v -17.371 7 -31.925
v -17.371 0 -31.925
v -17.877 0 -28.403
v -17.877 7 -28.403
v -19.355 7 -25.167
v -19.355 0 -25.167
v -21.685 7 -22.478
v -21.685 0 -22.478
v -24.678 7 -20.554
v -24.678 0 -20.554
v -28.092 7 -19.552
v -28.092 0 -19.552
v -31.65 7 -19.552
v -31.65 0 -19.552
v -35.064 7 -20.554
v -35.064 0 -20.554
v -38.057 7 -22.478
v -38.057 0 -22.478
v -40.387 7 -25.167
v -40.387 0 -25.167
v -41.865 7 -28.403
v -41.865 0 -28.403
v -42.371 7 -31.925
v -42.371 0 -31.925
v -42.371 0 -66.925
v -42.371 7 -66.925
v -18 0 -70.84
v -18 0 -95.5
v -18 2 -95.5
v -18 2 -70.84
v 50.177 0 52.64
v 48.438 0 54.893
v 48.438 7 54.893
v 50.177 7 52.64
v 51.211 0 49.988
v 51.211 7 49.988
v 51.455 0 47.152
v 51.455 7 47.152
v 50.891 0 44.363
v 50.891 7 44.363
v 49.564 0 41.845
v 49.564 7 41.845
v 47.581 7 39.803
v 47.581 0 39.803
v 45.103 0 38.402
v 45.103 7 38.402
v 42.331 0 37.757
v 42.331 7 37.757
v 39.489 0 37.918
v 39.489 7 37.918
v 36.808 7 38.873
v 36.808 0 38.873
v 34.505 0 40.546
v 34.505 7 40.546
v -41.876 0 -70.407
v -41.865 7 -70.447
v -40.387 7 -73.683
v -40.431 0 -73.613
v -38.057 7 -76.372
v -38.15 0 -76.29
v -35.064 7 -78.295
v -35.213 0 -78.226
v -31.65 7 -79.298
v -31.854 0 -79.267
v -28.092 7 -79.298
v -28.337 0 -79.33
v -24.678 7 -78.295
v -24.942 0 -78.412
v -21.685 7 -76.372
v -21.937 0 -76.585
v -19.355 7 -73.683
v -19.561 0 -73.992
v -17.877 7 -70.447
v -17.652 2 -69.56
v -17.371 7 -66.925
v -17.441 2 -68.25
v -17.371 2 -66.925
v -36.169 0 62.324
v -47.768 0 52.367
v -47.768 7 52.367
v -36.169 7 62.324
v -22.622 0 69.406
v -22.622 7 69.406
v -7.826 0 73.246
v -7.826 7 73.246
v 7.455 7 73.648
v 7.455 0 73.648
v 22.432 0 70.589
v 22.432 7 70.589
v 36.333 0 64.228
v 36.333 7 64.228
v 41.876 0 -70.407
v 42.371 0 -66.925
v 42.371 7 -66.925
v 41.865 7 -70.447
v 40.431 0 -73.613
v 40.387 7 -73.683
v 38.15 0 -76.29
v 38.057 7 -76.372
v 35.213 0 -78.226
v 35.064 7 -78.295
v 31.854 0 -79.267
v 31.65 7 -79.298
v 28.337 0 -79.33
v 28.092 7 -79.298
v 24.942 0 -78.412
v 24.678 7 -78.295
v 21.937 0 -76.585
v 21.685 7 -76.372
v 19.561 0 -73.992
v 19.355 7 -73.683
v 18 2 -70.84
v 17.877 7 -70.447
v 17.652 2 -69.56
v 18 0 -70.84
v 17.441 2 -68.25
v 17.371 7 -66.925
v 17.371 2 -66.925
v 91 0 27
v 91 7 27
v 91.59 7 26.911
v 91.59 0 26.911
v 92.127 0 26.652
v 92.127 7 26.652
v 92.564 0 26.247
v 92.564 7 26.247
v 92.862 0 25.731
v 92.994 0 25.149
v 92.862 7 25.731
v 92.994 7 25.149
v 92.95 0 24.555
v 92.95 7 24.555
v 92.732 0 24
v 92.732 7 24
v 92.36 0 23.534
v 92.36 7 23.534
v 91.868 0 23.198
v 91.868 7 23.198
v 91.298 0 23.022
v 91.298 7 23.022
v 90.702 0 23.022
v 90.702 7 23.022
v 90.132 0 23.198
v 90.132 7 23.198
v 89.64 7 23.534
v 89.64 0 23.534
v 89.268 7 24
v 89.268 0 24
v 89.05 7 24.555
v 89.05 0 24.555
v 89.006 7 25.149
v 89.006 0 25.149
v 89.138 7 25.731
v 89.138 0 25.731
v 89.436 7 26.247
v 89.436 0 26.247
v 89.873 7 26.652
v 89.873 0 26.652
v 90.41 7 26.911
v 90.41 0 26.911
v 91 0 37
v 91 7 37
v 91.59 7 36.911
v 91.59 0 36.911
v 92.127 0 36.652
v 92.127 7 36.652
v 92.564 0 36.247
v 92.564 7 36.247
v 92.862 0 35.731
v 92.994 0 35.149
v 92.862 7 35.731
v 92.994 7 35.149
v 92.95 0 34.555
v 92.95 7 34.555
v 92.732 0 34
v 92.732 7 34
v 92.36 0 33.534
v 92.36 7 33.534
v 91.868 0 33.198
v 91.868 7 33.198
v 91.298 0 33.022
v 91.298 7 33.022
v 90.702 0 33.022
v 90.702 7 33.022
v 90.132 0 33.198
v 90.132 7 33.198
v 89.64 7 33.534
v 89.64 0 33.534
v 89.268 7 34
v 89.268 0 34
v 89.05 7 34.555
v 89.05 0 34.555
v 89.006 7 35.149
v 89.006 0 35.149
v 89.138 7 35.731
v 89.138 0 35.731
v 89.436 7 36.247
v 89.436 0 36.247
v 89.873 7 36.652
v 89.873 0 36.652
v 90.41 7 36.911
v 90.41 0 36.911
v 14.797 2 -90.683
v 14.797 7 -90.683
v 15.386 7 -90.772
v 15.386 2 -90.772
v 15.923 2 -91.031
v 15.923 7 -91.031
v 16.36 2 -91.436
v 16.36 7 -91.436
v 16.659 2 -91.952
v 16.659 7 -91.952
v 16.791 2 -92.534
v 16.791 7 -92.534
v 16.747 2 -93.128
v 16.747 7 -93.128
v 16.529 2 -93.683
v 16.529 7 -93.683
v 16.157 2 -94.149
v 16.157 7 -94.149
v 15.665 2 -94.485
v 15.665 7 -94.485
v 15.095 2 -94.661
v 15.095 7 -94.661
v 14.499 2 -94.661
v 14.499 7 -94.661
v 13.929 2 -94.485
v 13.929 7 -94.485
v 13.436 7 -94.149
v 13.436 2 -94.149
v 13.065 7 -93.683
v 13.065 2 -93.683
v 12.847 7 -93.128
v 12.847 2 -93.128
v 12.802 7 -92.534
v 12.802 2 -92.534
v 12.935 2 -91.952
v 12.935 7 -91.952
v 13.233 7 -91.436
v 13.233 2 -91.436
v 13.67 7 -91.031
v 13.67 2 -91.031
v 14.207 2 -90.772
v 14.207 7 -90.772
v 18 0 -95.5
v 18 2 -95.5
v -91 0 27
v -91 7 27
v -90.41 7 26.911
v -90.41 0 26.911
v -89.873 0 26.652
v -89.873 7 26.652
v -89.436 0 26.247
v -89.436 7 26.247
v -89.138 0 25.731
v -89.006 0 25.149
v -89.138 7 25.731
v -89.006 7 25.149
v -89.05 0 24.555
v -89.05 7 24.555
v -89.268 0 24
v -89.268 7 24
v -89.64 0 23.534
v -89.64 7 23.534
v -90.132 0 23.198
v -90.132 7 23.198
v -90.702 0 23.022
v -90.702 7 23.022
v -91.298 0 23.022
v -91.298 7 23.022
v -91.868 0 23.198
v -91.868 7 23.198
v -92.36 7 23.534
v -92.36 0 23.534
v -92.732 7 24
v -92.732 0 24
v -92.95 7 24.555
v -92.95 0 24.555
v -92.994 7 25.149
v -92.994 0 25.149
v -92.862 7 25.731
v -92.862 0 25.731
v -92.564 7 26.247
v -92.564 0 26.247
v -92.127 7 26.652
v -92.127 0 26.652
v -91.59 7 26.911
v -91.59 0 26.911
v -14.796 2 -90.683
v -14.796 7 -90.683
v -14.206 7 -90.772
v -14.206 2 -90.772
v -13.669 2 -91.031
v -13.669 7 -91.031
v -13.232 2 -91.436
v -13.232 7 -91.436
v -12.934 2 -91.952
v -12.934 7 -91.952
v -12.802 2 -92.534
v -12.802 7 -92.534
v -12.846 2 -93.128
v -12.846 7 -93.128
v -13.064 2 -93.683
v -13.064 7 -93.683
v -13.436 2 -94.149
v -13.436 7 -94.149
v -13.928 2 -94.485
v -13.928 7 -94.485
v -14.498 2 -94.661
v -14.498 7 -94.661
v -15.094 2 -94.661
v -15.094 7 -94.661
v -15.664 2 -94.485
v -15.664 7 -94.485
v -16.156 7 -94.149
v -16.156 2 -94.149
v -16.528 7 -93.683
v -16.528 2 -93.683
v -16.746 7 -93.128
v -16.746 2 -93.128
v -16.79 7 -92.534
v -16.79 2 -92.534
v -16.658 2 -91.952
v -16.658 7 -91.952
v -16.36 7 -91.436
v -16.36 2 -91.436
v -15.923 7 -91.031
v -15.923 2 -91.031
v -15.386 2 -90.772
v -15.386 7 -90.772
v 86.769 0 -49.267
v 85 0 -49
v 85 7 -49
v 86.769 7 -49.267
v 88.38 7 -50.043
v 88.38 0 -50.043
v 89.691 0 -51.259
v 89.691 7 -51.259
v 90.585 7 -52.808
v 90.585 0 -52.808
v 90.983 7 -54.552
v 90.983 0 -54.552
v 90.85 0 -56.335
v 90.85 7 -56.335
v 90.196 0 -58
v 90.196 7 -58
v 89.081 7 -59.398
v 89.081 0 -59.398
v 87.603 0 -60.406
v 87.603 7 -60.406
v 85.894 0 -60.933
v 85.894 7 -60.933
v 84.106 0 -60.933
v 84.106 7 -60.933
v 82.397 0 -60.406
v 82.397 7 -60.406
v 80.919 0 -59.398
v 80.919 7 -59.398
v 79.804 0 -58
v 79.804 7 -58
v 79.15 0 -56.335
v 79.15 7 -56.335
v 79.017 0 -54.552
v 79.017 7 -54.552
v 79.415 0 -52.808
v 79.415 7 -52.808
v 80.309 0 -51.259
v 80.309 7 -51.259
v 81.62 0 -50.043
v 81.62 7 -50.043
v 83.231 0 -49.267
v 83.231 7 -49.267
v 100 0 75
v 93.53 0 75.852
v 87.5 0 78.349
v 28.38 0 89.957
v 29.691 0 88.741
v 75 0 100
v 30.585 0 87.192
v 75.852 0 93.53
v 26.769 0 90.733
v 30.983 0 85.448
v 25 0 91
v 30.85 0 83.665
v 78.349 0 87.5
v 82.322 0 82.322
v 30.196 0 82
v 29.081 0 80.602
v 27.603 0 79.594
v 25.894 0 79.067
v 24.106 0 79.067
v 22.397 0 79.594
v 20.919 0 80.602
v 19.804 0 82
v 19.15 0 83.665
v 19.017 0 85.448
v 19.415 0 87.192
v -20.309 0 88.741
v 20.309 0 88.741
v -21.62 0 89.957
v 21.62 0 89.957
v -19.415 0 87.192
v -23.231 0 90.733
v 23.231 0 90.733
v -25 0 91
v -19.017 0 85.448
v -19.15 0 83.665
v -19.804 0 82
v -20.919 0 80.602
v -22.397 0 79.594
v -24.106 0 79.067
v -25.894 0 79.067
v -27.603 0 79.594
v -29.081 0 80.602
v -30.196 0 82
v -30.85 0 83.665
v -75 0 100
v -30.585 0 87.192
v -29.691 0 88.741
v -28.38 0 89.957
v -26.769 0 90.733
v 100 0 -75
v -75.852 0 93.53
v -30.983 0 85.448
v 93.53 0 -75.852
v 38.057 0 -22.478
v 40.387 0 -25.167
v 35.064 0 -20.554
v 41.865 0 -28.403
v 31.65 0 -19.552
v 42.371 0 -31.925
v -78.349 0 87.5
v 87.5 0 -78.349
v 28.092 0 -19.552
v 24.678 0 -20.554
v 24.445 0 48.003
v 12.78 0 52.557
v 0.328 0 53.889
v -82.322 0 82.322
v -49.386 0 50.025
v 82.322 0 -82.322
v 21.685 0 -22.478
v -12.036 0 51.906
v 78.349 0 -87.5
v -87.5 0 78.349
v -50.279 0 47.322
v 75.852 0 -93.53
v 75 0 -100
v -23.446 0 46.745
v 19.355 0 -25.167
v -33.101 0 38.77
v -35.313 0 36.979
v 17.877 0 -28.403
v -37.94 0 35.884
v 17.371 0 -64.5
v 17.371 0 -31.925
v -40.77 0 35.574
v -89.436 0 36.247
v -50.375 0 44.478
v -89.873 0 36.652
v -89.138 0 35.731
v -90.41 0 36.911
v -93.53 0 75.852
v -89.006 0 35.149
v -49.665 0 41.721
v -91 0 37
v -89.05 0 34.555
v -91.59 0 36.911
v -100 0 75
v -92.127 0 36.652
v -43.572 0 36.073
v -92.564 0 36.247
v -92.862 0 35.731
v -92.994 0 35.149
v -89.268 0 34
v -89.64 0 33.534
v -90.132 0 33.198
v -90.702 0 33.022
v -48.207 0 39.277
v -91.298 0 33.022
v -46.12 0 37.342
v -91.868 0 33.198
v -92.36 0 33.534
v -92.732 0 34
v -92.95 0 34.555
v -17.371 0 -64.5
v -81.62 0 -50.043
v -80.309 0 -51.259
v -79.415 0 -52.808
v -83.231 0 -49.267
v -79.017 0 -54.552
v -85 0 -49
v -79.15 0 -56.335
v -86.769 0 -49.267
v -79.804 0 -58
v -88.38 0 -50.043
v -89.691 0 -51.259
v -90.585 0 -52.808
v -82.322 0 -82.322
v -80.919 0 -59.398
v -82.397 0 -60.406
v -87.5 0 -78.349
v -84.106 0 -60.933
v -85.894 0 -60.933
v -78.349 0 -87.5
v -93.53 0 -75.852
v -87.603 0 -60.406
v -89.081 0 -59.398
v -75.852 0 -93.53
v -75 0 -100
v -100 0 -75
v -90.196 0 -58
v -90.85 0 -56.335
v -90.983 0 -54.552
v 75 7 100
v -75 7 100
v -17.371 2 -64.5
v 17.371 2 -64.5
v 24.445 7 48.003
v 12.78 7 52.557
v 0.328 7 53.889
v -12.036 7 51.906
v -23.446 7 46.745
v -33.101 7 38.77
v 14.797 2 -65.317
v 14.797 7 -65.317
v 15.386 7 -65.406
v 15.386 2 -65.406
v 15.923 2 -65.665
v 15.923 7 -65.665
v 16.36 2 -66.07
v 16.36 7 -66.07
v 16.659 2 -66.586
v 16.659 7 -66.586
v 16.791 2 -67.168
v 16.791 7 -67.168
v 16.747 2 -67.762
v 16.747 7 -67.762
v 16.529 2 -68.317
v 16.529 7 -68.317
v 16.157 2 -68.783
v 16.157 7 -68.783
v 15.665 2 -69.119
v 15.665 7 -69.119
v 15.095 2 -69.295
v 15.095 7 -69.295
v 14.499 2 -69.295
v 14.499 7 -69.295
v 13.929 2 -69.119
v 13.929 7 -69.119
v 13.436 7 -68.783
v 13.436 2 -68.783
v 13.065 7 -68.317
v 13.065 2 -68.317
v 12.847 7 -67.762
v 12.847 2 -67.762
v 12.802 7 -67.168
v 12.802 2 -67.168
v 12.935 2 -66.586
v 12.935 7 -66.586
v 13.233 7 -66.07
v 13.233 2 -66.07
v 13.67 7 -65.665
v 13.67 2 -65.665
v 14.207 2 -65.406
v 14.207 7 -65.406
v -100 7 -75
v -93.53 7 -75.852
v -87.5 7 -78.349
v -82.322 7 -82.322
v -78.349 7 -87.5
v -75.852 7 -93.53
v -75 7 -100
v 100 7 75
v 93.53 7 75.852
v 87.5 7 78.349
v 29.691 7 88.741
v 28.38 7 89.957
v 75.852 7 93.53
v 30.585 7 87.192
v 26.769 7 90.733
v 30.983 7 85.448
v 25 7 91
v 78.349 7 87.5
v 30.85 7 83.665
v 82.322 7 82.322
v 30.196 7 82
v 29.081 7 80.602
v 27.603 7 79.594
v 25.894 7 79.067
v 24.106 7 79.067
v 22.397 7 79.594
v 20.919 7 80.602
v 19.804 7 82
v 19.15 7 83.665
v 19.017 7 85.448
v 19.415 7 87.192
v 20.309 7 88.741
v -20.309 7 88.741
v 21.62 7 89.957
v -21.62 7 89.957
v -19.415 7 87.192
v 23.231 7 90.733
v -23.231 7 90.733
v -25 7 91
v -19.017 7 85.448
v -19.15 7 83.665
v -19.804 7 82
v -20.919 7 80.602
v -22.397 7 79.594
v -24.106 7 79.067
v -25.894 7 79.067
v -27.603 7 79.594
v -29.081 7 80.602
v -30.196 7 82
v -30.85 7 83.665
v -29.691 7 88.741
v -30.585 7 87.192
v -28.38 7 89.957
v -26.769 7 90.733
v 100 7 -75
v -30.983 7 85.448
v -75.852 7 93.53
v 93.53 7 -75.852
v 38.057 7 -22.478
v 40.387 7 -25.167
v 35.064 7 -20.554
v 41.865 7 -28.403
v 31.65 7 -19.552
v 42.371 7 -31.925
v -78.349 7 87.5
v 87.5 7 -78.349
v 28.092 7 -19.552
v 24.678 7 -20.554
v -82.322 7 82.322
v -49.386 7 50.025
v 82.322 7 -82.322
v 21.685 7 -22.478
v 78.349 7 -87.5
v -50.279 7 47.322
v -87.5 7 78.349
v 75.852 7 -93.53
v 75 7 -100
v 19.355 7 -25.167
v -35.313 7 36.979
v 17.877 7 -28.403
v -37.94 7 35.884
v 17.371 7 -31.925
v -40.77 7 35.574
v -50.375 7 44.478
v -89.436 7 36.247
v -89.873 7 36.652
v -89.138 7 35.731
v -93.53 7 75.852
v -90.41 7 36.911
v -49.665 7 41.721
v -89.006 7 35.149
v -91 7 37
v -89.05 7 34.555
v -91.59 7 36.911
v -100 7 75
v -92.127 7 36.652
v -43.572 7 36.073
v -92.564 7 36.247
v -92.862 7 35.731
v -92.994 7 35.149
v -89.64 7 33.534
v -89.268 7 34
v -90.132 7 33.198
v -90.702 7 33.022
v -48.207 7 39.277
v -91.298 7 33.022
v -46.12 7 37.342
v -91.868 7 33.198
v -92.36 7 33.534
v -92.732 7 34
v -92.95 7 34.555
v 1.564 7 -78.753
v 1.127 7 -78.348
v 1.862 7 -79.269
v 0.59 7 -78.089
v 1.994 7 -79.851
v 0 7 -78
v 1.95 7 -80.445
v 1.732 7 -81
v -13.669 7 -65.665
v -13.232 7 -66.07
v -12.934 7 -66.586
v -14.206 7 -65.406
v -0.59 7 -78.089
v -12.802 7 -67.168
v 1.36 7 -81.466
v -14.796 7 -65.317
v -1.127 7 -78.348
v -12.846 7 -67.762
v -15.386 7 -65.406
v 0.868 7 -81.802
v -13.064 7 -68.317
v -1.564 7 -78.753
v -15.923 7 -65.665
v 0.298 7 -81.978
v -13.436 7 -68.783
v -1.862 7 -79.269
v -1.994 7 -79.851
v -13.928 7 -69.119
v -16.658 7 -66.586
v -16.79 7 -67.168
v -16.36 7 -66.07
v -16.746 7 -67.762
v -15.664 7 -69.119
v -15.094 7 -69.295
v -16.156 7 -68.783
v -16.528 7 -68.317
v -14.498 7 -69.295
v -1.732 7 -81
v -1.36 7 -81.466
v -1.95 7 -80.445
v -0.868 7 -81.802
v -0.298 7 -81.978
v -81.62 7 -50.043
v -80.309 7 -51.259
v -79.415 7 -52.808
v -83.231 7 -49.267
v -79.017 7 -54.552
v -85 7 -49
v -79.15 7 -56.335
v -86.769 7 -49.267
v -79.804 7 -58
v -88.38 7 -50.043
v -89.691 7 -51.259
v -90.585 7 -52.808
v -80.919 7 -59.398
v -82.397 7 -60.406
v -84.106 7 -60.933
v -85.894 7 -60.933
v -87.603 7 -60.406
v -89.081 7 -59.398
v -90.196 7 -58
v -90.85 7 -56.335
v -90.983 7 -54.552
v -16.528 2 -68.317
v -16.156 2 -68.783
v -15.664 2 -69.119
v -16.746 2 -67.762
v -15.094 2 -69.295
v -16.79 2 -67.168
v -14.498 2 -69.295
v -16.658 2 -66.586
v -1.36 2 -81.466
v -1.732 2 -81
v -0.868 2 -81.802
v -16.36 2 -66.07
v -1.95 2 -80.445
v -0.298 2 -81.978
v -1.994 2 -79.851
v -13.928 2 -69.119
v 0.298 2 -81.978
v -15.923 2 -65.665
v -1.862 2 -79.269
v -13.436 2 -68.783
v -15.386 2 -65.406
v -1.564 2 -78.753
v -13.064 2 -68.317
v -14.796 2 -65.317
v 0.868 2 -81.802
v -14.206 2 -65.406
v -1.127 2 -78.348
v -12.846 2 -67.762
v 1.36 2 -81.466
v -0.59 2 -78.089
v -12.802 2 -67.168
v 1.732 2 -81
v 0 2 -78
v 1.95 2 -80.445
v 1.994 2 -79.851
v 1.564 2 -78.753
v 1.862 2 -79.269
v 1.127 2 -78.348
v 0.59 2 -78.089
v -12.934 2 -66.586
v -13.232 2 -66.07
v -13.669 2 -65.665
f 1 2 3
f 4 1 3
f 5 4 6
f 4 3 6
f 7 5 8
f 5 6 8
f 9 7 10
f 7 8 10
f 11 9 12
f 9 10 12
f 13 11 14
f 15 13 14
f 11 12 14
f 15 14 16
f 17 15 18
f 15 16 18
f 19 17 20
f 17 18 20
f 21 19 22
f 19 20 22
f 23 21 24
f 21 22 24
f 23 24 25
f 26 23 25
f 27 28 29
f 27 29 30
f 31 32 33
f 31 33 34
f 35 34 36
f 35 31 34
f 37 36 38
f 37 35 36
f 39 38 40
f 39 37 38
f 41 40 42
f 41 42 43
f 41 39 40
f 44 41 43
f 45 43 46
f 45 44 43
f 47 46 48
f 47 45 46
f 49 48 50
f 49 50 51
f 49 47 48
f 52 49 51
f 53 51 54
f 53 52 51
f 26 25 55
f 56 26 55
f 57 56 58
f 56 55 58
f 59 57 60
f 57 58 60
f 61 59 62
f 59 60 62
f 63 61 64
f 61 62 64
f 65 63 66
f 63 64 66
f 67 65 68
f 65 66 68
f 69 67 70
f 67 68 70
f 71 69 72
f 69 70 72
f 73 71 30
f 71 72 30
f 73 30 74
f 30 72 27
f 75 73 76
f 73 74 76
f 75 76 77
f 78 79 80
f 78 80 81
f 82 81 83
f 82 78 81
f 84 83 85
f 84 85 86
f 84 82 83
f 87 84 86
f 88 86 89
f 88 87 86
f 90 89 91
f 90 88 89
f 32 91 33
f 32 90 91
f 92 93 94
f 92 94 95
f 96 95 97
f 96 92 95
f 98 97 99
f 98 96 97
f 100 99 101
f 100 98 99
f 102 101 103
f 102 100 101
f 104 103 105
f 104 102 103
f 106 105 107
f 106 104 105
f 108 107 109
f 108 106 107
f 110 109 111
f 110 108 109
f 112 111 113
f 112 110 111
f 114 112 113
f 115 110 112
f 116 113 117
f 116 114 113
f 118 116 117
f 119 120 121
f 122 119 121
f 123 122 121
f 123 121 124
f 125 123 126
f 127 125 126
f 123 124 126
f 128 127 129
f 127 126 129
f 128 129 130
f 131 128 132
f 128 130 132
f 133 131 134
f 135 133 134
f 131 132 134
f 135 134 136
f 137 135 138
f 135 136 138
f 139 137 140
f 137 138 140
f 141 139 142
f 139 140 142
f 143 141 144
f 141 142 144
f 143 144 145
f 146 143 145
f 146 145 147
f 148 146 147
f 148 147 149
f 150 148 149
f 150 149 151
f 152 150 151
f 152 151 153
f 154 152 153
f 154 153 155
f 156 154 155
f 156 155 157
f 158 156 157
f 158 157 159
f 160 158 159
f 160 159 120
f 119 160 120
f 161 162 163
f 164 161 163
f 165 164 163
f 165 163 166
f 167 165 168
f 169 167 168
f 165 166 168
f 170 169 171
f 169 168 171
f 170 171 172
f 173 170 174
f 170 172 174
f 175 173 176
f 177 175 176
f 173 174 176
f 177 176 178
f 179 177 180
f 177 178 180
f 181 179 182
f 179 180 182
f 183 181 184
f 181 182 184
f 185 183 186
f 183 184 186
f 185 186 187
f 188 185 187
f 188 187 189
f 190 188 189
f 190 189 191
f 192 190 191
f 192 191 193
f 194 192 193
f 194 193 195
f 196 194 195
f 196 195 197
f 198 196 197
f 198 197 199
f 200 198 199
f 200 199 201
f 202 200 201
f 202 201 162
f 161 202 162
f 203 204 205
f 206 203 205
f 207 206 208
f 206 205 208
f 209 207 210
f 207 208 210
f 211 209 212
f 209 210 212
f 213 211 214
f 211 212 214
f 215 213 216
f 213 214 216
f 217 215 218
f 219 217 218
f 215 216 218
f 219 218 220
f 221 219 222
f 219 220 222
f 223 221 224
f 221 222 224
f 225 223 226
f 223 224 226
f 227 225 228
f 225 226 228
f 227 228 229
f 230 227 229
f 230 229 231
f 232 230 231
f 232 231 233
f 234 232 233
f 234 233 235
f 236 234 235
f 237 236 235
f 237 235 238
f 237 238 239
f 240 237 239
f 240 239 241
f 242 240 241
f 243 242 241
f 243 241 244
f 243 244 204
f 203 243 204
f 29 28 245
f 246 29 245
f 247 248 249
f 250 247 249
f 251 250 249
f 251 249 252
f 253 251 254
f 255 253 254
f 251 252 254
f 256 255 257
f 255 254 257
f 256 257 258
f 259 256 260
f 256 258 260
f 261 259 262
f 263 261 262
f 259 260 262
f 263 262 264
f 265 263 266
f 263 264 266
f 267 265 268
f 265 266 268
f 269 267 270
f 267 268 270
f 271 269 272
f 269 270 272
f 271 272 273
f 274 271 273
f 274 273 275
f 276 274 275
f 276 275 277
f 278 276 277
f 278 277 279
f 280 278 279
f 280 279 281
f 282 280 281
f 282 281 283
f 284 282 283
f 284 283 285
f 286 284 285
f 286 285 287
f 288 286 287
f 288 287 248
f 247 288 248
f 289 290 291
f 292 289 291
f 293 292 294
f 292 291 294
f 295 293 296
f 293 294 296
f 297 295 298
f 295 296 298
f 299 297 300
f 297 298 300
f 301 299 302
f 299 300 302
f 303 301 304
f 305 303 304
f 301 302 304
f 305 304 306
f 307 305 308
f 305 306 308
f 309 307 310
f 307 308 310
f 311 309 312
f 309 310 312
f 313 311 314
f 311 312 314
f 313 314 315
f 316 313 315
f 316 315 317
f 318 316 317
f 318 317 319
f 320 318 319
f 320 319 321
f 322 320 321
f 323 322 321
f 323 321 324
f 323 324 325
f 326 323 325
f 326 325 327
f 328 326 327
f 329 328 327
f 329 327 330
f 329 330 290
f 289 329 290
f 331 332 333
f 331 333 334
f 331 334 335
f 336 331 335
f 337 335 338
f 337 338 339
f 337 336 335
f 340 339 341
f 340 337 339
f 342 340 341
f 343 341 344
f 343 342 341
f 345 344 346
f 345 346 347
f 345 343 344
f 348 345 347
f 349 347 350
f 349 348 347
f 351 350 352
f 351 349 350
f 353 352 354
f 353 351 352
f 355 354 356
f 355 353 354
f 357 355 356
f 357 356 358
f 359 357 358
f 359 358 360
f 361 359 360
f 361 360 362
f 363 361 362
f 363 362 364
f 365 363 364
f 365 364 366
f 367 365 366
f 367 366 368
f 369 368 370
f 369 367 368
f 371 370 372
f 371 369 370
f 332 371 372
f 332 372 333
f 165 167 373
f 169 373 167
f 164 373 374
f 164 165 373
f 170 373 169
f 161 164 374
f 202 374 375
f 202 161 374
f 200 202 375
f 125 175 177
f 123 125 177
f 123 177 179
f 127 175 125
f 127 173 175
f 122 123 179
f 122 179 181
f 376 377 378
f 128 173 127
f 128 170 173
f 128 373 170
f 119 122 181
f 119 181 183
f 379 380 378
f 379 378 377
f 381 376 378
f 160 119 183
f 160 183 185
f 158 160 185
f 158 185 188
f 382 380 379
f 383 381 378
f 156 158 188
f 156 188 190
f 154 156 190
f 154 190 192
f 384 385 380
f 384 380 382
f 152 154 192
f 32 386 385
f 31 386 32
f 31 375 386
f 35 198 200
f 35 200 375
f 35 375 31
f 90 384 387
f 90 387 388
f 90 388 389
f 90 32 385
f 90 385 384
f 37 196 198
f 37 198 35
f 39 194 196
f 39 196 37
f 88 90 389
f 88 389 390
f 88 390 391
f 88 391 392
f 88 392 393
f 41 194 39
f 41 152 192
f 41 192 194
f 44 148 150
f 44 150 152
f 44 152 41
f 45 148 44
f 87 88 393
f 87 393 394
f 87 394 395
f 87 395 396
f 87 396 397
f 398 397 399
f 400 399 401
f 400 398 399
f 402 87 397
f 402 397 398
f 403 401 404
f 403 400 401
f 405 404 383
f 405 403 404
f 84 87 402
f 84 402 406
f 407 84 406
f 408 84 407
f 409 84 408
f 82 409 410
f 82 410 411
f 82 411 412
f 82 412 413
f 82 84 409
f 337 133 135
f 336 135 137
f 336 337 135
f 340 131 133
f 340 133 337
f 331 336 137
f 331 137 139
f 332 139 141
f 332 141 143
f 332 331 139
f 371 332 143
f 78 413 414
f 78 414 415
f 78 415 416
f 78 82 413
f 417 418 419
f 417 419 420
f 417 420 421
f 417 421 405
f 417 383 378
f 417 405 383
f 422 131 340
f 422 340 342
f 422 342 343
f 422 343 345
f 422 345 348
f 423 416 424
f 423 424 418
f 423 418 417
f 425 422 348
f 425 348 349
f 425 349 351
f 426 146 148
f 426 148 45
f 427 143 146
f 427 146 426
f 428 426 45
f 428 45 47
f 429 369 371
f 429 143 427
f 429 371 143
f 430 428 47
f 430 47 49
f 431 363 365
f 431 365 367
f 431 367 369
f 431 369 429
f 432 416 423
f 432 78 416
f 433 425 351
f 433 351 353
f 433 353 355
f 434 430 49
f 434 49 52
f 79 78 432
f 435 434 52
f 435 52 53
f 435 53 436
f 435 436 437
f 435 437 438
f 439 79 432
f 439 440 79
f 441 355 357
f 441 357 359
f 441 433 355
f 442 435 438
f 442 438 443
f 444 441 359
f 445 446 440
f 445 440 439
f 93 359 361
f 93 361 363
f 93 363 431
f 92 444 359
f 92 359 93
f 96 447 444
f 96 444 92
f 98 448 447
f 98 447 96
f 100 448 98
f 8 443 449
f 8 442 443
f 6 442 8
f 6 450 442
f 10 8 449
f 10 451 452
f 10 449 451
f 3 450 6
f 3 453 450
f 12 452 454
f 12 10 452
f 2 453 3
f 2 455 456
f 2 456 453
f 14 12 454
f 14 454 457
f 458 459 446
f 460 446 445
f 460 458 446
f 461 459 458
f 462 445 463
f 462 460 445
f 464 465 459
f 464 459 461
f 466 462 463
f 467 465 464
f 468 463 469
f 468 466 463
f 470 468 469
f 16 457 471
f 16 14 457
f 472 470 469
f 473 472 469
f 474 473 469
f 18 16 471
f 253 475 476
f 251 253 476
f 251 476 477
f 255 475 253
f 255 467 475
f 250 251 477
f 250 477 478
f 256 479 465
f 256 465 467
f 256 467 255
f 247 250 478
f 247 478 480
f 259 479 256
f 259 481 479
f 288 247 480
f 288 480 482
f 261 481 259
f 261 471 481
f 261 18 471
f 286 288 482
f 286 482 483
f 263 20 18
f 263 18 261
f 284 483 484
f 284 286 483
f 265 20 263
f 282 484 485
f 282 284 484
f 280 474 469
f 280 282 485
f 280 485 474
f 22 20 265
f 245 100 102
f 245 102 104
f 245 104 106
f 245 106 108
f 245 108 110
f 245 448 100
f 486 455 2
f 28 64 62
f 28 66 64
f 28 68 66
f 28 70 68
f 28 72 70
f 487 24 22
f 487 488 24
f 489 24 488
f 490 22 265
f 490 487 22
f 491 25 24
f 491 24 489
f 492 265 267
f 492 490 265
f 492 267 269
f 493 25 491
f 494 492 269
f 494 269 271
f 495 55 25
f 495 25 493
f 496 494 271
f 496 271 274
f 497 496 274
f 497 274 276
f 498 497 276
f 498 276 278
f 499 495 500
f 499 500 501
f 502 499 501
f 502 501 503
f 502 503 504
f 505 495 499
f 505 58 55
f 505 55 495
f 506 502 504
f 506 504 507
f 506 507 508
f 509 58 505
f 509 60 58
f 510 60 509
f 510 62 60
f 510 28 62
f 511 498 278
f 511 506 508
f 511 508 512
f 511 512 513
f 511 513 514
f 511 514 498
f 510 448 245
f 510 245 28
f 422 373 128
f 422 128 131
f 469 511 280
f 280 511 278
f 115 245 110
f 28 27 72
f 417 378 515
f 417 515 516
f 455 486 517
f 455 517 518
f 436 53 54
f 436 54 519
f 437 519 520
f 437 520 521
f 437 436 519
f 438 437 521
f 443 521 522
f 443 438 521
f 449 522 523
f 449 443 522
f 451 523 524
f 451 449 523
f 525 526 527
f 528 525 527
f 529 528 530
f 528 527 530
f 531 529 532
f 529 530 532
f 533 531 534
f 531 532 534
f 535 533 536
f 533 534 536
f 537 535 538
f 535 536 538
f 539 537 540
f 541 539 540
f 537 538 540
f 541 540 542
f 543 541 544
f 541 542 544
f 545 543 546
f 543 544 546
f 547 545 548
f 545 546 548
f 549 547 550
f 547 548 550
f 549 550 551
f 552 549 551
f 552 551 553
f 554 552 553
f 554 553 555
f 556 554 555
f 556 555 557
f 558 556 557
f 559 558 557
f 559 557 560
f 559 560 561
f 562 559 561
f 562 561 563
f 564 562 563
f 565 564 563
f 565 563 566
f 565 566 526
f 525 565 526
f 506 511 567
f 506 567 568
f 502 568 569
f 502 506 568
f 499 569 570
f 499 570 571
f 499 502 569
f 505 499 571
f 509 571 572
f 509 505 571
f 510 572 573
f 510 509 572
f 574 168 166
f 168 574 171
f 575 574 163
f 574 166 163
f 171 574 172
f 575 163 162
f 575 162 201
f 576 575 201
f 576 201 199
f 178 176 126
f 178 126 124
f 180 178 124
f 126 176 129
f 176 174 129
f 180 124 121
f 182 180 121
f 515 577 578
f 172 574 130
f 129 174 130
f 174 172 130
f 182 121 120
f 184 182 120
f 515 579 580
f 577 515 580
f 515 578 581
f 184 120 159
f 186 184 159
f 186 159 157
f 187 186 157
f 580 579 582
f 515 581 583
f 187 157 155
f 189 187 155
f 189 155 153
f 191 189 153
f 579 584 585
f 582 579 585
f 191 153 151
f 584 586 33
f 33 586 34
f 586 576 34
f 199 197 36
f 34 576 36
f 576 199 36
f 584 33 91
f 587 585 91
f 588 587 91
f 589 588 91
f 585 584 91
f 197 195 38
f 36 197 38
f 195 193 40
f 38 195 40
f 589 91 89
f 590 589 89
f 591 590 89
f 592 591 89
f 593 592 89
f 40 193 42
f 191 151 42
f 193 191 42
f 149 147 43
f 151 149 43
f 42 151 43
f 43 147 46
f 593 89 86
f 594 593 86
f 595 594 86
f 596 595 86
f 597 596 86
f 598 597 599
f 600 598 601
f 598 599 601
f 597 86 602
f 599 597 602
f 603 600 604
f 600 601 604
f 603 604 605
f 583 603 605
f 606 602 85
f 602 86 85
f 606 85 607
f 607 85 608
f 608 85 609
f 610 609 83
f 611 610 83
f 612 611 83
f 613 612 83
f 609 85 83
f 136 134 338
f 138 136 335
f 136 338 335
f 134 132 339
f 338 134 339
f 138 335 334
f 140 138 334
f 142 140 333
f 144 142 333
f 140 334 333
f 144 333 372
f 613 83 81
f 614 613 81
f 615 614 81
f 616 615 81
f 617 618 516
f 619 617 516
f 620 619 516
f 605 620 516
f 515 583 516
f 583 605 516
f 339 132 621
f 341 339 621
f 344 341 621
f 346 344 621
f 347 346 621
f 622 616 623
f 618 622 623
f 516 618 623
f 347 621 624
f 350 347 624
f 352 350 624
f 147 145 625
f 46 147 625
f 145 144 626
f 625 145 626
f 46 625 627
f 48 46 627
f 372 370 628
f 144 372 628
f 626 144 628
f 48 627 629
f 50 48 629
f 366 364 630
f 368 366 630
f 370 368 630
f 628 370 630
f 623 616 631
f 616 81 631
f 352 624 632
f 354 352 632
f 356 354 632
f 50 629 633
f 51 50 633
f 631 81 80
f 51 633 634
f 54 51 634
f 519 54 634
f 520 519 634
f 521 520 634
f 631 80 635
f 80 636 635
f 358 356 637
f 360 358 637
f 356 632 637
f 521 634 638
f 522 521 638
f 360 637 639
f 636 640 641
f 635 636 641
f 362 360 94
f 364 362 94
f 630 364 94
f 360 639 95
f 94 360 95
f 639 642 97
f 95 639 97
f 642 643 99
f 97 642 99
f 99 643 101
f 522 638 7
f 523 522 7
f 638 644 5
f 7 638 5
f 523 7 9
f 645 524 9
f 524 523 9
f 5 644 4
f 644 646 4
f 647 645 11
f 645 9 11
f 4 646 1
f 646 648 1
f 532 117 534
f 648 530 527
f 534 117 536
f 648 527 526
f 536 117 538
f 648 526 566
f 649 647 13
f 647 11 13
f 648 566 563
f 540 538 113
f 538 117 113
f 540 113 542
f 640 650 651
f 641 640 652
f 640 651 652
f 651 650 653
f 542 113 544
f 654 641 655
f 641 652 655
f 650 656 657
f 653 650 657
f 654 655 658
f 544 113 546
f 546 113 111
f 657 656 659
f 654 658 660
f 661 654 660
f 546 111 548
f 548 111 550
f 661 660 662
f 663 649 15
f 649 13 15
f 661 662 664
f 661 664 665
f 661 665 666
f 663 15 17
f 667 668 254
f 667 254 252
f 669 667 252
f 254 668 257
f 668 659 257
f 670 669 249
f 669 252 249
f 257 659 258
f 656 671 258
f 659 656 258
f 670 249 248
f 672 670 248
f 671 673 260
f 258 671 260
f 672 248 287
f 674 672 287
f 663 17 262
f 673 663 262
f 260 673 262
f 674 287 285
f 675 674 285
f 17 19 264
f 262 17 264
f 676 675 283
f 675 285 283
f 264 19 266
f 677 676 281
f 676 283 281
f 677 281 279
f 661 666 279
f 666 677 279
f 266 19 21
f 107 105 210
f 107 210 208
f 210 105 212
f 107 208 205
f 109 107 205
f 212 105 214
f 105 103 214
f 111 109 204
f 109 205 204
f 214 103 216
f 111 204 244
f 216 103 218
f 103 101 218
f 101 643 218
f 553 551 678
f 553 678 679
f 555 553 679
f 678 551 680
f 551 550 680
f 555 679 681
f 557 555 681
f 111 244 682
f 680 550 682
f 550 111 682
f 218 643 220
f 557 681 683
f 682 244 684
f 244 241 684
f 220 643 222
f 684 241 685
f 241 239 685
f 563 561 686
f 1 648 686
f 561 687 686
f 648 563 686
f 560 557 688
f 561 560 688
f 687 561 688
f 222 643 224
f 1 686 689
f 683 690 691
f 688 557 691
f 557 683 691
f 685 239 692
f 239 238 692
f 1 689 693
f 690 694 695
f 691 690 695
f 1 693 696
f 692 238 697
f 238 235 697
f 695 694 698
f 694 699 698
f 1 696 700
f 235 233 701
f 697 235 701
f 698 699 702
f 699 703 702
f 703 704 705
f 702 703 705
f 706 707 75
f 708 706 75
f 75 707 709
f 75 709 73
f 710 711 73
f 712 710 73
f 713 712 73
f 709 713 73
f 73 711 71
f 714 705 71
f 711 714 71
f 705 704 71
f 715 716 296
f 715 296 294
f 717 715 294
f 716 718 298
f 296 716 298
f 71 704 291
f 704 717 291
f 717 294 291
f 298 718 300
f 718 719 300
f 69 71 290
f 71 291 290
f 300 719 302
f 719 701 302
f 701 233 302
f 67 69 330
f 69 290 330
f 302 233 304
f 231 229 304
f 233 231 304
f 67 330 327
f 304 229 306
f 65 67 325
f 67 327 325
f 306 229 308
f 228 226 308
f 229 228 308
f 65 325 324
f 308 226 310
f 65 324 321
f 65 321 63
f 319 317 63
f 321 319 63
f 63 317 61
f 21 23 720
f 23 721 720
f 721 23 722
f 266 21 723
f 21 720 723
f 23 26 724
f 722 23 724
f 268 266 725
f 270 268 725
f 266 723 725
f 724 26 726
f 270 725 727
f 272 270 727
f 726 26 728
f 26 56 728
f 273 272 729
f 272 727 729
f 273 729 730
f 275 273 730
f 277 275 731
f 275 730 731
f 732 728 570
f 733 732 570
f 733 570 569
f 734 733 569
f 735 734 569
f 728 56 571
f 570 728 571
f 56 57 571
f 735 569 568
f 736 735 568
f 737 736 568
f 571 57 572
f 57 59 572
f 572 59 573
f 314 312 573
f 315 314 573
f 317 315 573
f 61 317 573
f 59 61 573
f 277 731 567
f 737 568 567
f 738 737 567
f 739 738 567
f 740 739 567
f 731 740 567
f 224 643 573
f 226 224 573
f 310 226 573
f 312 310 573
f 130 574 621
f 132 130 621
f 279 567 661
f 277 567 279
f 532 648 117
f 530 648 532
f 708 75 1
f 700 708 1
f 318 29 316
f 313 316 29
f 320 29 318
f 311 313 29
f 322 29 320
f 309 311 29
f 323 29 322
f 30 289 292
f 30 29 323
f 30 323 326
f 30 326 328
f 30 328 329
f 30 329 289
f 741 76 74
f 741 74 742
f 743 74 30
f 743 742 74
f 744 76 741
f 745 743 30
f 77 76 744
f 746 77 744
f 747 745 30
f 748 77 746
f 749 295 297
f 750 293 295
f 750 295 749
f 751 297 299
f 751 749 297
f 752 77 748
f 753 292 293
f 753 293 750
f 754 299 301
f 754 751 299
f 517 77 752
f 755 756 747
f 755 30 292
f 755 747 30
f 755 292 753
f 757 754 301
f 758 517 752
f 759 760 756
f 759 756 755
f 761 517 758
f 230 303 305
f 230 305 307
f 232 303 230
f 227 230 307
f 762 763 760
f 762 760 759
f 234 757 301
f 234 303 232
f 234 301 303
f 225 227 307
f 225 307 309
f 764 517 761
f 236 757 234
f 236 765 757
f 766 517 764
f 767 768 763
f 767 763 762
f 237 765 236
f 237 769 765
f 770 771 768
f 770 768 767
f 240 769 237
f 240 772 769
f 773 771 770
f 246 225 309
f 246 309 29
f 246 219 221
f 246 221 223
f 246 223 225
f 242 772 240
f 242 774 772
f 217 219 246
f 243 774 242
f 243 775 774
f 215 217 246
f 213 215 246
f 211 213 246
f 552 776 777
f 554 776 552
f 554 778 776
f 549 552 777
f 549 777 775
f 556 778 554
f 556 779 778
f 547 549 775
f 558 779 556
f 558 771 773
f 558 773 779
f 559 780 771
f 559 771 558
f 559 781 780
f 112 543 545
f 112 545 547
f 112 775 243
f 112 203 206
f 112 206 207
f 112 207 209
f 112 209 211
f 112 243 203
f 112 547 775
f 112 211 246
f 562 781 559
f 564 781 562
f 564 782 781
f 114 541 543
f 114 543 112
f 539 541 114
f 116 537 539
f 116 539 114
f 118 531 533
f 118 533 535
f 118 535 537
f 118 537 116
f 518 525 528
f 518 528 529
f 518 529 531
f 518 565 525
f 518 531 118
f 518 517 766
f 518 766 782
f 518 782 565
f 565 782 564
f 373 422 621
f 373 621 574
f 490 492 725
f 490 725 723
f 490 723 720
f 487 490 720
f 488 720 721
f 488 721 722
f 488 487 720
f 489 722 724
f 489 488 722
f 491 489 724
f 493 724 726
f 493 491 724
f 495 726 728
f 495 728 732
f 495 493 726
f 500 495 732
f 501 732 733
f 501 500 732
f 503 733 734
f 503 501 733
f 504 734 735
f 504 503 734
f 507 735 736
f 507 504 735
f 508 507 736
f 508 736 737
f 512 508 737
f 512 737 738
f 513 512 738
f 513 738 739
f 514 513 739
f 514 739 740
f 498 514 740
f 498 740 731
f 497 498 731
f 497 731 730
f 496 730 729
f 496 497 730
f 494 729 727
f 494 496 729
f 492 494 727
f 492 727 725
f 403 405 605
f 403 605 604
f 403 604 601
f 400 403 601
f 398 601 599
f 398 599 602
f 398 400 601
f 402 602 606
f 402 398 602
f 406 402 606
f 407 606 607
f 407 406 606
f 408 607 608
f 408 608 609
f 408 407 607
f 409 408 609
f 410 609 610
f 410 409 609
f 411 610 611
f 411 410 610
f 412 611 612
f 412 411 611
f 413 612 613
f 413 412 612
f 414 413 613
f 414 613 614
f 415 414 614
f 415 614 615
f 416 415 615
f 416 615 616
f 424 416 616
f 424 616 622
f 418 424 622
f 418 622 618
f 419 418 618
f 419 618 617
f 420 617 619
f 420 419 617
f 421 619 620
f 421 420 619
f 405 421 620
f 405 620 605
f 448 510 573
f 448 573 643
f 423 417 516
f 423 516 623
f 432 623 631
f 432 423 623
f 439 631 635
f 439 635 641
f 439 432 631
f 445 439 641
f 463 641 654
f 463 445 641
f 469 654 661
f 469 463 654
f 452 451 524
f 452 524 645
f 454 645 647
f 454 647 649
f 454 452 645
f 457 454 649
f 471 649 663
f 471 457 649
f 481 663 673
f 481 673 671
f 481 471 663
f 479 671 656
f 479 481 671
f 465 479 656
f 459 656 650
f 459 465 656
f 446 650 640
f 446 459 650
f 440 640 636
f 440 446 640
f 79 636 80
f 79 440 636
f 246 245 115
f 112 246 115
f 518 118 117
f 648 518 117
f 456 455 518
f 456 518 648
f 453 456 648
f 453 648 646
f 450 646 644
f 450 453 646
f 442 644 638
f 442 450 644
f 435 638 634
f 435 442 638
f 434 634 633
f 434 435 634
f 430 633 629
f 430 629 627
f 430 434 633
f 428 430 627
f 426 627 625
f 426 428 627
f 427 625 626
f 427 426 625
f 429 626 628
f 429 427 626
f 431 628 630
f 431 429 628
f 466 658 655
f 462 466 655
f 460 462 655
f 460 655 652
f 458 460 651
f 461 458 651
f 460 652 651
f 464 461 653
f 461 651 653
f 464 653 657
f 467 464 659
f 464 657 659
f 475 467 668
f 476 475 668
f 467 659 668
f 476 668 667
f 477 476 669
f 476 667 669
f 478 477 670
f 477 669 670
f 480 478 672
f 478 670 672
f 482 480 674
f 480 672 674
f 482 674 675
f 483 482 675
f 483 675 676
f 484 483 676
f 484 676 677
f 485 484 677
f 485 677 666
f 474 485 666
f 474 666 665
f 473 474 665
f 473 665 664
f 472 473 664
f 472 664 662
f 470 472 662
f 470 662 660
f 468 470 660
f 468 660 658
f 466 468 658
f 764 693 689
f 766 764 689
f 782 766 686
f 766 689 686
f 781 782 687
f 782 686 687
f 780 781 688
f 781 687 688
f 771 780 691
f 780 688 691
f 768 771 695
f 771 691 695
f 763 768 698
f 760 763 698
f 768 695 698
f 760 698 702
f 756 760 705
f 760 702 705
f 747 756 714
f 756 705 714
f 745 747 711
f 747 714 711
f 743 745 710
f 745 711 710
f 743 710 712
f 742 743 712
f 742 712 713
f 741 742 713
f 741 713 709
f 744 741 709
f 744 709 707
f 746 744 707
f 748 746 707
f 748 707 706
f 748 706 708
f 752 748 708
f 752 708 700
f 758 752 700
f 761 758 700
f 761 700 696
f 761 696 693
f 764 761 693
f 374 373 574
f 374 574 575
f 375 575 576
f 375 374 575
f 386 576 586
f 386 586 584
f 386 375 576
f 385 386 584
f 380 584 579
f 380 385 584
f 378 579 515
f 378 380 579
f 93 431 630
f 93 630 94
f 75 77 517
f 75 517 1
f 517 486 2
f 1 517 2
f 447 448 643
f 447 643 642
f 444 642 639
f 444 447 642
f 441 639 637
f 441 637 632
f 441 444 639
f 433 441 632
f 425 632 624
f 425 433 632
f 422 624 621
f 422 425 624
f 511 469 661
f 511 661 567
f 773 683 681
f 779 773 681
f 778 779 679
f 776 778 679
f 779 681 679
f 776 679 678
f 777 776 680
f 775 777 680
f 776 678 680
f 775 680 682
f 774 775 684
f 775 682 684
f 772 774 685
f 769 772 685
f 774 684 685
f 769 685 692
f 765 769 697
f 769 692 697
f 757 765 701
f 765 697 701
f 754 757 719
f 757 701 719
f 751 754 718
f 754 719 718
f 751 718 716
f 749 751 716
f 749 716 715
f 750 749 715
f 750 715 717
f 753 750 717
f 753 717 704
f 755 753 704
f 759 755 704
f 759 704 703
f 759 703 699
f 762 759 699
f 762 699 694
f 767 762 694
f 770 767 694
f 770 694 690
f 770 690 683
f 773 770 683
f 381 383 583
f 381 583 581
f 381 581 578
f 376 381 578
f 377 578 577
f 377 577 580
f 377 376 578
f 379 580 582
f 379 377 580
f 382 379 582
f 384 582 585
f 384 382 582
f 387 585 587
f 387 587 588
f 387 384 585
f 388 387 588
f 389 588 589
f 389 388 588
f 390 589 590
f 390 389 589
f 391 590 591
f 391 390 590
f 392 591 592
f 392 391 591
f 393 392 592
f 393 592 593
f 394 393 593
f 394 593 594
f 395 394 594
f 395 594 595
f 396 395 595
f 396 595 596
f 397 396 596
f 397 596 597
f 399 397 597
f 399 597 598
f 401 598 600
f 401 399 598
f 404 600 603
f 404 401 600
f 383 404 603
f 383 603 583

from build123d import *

# Parameters (mm, degrees)
SKETCH1_R           = 6
BOSS_EXTRUDE2_DEPTH = 7
SKETCH2_R           = 2
CUT_EXTRUDE1_DEPTH  = 142.594491418
SKETCH3_R           = 2
CUT_EXTRUDE3_DEPTH  = 142.594491418
SKETCH4_R           = 2
CUT_EXTRUDE4_DEPTH  = 142.594491418
SKETCH5_W           = 36
SKETCH5_H           = 31
CUT_EXTRUDE7_DEPTH  = 2


with BuildPart() as part:
    # Sketch1 → Boss-Extrude2 (new body)
    with BuildSketch(Plane(origin=(0, 0, 0), x_dir=(1, 0, 0), z_dir=(0, 1, 0))):
        with BuildLine():
            Line((-75, 100), (75, 100))
            ThreePointArc((75, 100), (82.32233047, 82.32233047), (100, 75))
            Line((100, 75), (100, -75))
            ThreePointArc((100, -75), (82.32233047, -82.32233047), (75, -100))
            Line((75, -100), (-75, -100))
            ThreePointArc((-75, -100), (-82.32233047, -82.32233047), (-100, -75))
            Line((-100, -75), (-100, 75))
            ThreePointArc((-100, 75), (-82.32233047, 82.32233047), (-75, 100))
        make_face()
        with Locations(Location((-85, 55, 0), (0, 0, 270))):
            Circle(SKETCH1_R, mode=Mode.SUBTRACT)
        with Locations(Location((85, 55, 0), (0, 0, 270))):
            Circle(SKETCH1_R, mode=Mode.SUBTRACT)
        with Locations(Location((25, -85, 0), (0, 0, 270))):
            Circle(SKETCH1_R, mode=Mode.SUBTRACT)
        with Locations(Location((-25, -85, 0), (0, 0, 270))):
            Circle(SKETCH1_R, mode=Mode.SUBTRACT)
        with BuildLine():
            Line((-17.370892019, 66.924882629), (-17.370892019, 31.924882629))
            ThreePointArc((-17.370892019, 31.924882629), (-29.870892019, 19.424882629), (-42.370892019, 31.924882629))
            Line((-42.370892019, 31.924882629), (-42.370892019, 66.924882629))
            ThreePointArc((-42.370892019, 66.924882629), (-29.870892019, 79.424882629), (-17.370892019, 66.924882629))
        make_face(mode=Mode.SUBTRACT)
        with BuildLine():
            Line((17.370892019, 66.924882629), (17.370892019, 31.924882629))
            ThreePointArc((17.370892019, 31.924882629), (29.870892019, 19.424882629), (42.370892019, 31.924882629))
            Line((42.370892019, 31.924882629), (42.370892019, 66.924882629))
            ThreePointArc((42.370892019, 66.924882629), (29.870892019, 79.424882629), (17.370892019, 66.924882629))
        make_face(mode=Mode.SUBTRACT)
        with BuildLine():
            ThreePointArc((-47.767999672, -52.36655043), (-0.196924647, -73.88254423), (48.43804341, -54.893467096))
            ThreePointArc((48.43804341, -54.893467096), (48.645377153, -40.752851384), (34.504761441, -40.545517641))
            ThreePointArc((34.504761441, -40.545517641), (0.328207745, -53.889439519), (-33.100731657, -38.769813727))
            ThreePointArc((-33.100731657, -38.769813727), (-47.232734016, -38.234548071), (-47.767999672, -52.36655043))
        make_face(mode=Mode.SUBTRACT)
    extrude(amount=BOSS_EXTRUDE2_DEPTH)

    # Sketch2 → Cut-Extrude1 (cut, through all)
    with BuildSketch(Plane(origin=(0, 7, 0), x_dir=(1, 0, 0), z_dir=(0, 1, 0))):
        with Locations(Location((-91, -25, 0), (0, 0, 270))):
            Circle(SKETCH2_R)
        with Locations(Location((0, 80, 0), (0, 0, 270))):
            Circle(SKETCH2_R)
        with Locations(Location((91, -25, 0), (0, 0, 270))):
            Circle(SKETCH2_R)
    extrude(amount=-CUT_EXTRUDE1_DEPTH, mode=Mode.SUBTRACT)

    # Sketch3 → Cut-Extrude3 (cut, through all)
    with BuildSketch(Plane(origin=(0, 7, 0), x_dir=(1, 0, 0), z_dir=(0, 1, 0))):
        with Locations(Location((-91, -35, 0), (0, 0, 270))):
            Circle(SKETCH3_R)
        with Locations(Location((91, -35, 0), (0, 0, 270))):
            Circle(SKETCH3_R)
    extrude(amount=-CUT_EXTRUDE3_DEPTH, mode=Mode.SUBTRACT)

    # Sketch4 → Cut-Extrude4 (cut, through all)
    with BuildSketch(Plane(origin=(0, 7, 0), x_dir=(1, 0, 0), z_dir=(0, 1, 0))):
        with Locations(Location((-14.796, 67.317, 0), (0, 0, 270))):
            Circle(SKETCH4_R)
        with Locations(Location((-14.796, 92.683, 0), (0, 0, 270))):
            Circle(SKETCH4_R)
        with Locations(Location((14.796833333, 92.683, 0), (0, 0, 270))):
            Circle(SKETCH4_R)
        with Locations(Location((14.796833333, 67.317, 0), (0, 0, 270))):
            Circle(SKETCH4_R)
    extrude(amount=-CUT_EXTRUDE4_DEPTH, mode=Mode.SUBTRACT)

    # Sketch5 → Cut-Extrude7 (cut)
    with BuildSketch(Plane.XZ):
        with Locations((0, -80)):
            Rectangle(SKETCH5_W, SKETCH5_H)
    extrude(amount=-CUT_EXTRUDE7_DEPTH, mode=Mode.SUBTRACT)


solid = part.part
